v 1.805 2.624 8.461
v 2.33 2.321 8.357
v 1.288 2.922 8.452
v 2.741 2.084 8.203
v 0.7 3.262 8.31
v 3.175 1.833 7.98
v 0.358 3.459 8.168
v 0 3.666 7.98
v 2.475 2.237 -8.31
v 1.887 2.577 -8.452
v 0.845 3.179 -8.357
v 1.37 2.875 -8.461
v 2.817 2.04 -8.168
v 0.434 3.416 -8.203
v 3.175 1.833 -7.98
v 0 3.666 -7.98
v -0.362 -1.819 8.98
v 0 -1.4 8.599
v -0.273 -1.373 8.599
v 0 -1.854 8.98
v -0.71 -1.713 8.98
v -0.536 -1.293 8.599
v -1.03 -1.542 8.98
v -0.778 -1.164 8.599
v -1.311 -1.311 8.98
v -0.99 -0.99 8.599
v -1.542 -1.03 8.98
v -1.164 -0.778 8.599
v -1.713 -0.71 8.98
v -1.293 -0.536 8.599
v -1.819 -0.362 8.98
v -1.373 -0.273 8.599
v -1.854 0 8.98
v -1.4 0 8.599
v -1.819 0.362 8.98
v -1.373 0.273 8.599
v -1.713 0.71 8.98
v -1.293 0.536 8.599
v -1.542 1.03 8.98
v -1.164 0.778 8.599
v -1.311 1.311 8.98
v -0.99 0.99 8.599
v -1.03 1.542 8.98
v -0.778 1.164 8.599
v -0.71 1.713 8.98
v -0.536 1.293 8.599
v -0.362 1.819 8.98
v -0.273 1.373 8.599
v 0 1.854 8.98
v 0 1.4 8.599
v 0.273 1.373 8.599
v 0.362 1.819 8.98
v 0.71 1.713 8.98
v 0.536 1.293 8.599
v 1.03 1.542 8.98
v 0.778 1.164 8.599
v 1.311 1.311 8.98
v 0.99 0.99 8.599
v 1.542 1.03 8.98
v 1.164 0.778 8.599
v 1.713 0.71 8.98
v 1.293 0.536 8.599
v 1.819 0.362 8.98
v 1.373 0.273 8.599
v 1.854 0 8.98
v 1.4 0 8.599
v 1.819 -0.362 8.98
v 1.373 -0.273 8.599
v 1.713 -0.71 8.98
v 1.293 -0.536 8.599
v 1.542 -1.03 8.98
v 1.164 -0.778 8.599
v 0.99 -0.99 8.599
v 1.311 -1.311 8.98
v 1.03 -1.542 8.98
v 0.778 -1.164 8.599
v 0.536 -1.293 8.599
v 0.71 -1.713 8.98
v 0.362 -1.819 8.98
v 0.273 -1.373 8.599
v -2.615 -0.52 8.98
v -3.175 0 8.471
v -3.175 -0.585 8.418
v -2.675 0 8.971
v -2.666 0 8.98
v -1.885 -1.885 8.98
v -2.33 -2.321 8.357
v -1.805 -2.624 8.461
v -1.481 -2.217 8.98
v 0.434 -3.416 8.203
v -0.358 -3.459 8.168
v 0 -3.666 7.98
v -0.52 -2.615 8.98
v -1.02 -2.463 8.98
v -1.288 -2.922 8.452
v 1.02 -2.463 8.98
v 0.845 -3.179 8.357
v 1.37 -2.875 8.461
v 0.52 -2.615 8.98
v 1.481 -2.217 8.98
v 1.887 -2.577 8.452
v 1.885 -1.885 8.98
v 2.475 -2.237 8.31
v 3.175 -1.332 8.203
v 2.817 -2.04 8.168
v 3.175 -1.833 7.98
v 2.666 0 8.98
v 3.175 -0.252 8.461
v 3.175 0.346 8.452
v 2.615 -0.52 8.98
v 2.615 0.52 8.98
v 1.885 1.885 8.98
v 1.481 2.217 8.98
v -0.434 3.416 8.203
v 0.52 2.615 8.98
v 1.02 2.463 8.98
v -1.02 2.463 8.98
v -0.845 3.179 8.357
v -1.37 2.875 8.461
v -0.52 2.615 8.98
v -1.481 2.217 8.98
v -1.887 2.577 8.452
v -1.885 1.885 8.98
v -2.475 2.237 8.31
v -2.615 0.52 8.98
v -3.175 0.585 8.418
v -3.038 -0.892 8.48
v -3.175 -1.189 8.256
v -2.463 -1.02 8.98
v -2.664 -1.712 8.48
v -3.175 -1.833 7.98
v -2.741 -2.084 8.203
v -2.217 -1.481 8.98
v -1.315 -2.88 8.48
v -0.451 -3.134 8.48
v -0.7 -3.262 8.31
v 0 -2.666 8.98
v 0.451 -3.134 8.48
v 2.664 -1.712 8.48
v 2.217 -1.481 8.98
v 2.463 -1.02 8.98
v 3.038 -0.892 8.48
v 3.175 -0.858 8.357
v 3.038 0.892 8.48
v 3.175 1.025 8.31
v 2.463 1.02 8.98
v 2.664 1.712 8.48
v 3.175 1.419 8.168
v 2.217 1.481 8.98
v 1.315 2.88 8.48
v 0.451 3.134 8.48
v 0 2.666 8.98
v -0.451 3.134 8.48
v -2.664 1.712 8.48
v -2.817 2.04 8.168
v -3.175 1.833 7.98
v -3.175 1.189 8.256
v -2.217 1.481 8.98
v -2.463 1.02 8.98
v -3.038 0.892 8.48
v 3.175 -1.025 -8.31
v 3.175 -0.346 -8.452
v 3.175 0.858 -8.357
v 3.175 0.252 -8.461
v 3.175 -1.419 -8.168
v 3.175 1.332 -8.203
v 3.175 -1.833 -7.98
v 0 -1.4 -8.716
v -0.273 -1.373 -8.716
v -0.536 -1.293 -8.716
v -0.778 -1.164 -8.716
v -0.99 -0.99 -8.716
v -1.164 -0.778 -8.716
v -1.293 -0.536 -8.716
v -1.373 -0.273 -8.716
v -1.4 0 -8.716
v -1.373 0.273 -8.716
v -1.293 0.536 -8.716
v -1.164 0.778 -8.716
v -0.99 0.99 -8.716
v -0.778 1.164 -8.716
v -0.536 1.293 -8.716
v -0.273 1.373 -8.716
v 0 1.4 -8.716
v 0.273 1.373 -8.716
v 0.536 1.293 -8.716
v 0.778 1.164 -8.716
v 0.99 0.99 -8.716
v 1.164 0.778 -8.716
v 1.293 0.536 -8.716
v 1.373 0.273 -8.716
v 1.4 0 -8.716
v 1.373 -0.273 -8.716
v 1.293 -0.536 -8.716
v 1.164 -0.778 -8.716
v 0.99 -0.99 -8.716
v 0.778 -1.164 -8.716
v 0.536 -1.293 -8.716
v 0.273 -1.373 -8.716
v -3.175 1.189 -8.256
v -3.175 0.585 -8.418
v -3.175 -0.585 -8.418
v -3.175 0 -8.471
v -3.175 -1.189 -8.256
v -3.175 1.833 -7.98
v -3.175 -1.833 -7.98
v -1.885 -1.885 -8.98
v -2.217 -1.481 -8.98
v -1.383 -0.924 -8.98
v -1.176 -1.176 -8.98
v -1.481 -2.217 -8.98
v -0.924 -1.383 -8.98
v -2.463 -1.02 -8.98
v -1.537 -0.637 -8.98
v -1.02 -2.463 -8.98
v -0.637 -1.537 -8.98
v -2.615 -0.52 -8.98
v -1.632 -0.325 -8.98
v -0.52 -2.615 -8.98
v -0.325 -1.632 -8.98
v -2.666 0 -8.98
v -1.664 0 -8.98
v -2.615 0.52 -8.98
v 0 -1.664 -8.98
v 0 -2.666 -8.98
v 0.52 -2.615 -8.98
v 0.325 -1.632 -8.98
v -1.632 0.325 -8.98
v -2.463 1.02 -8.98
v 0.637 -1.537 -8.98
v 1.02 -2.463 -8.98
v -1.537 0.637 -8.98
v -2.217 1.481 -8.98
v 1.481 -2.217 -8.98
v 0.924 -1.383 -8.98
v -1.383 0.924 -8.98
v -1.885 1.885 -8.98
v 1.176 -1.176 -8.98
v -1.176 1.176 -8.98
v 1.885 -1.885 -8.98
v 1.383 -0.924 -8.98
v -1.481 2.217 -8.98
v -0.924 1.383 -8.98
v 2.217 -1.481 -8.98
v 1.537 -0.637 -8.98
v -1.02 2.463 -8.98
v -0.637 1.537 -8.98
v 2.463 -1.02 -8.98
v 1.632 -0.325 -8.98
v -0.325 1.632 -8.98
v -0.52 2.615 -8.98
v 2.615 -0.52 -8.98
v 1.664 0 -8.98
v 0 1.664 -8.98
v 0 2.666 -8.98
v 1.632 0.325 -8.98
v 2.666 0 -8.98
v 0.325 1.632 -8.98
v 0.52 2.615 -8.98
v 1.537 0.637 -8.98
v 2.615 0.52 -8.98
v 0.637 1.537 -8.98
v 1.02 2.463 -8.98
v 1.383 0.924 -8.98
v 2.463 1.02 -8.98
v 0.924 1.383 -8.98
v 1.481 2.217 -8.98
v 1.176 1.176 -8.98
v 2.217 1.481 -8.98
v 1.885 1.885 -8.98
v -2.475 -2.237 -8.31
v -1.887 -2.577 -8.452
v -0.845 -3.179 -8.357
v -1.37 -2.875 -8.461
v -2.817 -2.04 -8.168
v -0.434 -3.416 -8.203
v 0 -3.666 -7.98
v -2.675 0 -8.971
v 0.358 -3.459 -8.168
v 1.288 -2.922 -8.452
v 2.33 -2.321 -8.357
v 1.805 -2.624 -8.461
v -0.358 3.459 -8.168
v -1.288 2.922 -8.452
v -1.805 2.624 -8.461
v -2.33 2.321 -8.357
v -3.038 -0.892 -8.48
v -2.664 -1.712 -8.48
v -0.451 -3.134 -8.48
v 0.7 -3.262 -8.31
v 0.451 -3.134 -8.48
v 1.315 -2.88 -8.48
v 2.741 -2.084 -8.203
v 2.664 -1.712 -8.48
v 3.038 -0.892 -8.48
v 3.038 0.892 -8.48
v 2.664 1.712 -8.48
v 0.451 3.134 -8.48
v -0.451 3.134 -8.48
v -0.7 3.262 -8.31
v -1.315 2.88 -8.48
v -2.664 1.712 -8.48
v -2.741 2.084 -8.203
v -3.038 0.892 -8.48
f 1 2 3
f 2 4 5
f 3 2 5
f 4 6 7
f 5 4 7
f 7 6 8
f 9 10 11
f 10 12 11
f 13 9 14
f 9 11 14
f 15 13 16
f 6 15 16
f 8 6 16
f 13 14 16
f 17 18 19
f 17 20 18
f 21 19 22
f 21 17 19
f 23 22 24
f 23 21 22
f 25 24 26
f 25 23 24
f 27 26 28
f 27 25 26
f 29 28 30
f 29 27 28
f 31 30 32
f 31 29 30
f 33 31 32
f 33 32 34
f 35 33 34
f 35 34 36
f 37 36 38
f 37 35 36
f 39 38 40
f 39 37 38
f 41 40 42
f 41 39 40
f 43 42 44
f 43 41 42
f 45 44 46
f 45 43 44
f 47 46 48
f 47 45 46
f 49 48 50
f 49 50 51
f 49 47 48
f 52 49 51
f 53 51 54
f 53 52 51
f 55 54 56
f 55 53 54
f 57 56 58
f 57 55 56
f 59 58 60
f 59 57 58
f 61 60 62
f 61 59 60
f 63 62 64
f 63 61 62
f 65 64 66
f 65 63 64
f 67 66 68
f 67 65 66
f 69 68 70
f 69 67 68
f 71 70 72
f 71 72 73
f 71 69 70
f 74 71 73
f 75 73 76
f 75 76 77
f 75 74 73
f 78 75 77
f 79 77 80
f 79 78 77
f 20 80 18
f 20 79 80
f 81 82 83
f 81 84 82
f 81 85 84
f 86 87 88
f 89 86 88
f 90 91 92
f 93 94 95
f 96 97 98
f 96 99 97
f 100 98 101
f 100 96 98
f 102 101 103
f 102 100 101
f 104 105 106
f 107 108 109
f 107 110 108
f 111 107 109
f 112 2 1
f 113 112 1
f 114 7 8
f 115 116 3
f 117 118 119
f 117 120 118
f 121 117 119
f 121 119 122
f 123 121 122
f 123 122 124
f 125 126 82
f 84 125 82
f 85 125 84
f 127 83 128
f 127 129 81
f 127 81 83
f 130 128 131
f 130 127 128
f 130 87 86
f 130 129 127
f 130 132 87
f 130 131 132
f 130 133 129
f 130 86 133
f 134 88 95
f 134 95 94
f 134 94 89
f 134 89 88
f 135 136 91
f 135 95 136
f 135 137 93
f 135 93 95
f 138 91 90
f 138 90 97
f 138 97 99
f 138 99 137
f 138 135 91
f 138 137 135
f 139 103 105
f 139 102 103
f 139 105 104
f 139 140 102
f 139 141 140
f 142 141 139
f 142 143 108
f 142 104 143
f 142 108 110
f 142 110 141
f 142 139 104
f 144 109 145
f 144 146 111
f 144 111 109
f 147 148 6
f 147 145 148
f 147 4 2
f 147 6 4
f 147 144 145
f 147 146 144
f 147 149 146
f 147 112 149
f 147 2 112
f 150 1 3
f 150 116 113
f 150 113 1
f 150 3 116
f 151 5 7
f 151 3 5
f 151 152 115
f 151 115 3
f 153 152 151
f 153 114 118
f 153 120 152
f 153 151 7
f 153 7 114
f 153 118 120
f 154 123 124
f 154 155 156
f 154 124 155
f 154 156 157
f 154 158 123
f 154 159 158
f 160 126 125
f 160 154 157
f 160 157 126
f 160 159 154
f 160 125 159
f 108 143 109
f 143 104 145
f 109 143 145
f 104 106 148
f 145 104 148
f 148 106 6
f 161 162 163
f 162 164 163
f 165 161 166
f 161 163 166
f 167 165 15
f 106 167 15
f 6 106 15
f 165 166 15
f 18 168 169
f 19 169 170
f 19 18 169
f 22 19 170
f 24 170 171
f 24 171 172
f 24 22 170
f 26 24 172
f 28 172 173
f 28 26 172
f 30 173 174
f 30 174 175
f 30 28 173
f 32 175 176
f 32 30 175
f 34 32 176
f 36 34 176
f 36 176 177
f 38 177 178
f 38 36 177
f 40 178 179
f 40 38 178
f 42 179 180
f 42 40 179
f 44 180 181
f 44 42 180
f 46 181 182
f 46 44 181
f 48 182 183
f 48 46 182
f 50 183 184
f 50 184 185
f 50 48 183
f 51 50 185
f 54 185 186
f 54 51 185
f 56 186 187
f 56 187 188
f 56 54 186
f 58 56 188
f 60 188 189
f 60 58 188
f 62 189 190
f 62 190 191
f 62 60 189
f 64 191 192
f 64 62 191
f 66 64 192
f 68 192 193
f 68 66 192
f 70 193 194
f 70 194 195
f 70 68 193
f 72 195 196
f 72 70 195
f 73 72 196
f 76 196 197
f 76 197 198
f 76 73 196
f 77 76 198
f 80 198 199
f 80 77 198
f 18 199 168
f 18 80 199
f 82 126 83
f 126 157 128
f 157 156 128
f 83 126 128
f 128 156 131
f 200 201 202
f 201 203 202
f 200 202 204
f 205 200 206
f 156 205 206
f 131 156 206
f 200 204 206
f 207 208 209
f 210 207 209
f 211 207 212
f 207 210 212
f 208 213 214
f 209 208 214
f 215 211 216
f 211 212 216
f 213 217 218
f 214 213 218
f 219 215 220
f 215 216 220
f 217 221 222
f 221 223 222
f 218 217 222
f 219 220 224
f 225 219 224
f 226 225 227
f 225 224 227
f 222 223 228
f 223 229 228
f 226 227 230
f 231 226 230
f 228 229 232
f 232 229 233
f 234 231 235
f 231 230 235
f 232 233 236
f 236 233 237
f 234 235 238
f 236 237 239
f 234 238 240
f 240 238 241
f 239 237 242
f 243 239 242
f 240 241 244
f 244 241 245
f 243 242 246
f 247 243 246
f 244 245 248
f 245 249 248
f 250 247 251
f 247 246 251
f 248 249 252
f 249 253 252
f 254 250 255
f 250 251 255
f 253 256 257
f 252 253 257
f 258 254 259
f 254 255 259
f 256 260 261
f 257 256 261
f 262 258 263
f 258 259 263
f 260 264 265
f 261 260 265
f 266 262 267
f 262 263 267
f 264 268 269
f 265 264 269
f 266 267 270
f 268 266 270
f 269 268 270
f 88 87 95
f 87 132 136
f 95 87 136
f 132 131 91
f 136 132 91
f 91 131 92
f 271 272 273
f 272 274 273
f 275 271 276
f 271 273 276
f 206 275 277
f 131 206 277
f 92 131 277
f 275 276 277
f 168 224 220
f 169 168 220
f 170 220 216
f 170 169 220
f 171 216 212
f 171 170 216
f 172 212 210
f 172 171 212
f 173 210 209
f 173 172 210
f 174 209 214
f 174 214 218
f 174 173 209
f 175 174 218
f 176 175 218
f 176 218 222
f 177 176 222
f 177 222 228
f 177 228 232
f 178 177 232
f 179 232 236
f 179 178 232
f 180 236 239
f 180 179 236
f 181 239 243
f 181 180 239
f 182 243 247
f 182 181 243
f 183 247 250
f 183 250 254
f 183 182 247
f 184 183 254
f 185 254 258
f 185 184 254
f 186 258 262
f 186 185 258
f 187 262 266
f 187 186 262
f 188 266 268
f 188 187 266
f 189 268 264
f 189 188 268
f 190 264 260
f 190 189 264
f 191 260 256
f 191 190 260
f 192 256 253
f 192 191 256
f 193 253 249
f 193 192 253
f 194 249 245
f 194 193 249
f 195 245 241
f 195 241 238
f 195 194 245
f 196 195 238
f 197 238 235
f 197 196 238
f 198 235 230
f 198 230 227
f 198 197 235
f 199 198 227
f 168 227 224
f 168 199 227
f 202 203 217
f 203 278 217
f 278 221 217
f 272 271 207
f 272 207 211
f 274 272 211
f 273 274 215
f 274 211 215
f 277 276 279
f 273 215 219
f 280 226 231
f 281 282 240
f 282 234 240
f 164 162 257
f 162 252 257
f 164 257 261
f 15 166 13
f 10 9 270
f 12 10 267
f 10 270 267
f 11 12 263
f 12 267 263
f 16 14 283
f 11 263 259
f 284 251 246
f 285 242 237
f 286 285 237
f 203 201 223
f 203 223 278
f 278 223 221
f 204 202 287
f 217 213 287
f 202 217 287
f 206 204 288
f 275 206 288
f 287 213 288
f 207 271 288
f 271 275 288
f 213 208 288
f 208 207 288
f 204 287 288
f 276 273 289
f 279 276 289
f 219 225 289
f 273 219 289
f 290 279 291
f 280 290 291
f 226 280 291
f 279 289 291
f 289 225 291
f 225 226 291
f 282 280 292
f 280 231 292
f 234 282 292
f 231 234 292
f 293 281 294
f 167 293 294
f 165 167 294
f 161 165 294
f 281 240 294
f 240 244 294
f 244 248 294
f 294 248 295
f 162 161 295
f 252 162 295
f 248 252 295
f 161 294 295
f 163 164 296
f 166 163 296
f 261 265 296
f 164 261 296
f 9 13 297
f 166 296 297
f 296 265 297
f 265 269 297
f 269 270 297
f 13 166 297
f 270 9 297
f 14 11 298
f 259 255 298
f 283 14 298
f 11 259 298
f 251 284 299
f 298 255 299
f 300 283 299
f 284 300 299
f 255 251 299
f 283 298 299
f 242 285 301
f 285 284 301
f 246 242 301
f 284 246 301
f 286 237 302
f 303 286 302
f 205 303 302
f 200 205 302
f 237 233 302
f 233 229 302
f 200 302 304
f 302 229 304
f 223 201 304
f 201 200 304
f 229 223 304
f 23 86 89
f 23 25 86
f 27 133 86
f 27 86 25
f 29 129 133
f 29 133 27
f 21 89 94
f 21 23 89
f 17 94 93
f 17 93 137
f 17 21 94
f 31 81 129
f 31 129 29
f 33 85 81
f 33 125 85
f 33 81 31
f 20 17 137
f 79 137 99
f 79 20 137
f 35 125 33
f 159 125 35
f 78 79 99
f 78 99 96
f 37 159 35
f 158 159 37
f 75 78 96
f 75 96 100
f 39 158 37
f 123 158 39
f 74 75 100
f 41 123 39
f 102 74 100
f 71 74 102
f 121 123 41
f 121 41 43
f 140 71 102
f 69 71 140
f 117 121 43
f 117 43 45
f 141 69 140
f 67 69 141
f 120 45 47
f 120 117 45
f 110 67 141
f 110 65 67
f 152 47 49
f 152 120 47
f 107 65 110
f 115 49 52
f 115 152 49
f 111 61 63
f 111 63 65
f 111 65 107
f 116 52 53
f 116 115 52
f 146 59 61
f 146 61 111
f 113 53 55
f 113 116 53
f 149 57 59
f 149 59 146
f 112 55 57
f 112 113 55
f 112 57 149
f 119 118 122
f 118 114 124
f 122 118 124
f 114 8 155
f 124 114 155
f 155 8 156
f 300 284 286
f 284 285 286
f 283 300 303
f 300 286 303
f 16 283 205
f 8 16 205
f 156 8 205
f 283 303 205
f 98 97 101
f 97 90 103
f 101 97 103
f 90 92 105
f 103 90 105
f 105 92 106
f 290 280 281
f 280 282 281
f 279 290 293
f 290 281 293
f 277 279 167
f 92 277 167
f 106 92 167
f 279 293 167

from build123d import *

# Parameters (mm, degrees)
BOSS_EXTRUDE1_DEPTH      = 8.98
BOSS_EXTRUDE1_DEPTH_BACK = 8.98


with BuildPart() as part:
    # Sketch1 → Boss-Extrude1 (new, two sides: drawn at the far end of the back side and taken through both)
    with BuildSketch(Plane.XY.offset(-BOSS_EXTRUDE1_DEPTH_BACK)):
        Polygon((3.175, -1.833087105), (3.175, 1.833087105), (0, 3.666174209), (-3.175, 1.833087105), (-3.175, -1.833087105), (0, -3.666174209), align=None)
    extrude(amount=BOSS_EXTRUDE1_DEPTH + BOSS_EXTRUDE1_DEPTH_BACK)

    # Sketch3 → Cut-Revolve2 (revolve, cut)
    with BuildSketch(Plane(origin=(0, 0, 0), x_dir=(0, 0, -1), z_dir=(1, 0, 0))):
        Polygon((-7.98, 3.666174209), (-8.98, 2.666174209), (-8.98, 3.666174209), align=None)
    cut_revolve2 = revolve(axis=Axis((0, 0, -0.635), (0, 0, 1)), mode=Mode.SUBTRACT)

    # Mirror1: Cut-Revolve2 across plane
    add(cut_revolve2.mirror(Plane.XY), mode=Mode.SUBTRACT)

    # Sketch4 → CSK for #1 Flat Head Machine Screw (100)1 (revolve, cut)
    with BuildSketch(Plane(origin=(0, 0, 8.98), x_dir=(0, -1, 0), z_dir=(1, 0, 0))):
        Polygon((0, 0), (0, 17.96), (1.6637, 17.96), (1.4, 17.6963), (1.4, 0.381119052), (1.8542, 0), align=None)
    revolve(axis=Axis((0, 0, 15.33), (0, 0, -1)), mode=Mode.SUBTRACT)


solid = part.part
